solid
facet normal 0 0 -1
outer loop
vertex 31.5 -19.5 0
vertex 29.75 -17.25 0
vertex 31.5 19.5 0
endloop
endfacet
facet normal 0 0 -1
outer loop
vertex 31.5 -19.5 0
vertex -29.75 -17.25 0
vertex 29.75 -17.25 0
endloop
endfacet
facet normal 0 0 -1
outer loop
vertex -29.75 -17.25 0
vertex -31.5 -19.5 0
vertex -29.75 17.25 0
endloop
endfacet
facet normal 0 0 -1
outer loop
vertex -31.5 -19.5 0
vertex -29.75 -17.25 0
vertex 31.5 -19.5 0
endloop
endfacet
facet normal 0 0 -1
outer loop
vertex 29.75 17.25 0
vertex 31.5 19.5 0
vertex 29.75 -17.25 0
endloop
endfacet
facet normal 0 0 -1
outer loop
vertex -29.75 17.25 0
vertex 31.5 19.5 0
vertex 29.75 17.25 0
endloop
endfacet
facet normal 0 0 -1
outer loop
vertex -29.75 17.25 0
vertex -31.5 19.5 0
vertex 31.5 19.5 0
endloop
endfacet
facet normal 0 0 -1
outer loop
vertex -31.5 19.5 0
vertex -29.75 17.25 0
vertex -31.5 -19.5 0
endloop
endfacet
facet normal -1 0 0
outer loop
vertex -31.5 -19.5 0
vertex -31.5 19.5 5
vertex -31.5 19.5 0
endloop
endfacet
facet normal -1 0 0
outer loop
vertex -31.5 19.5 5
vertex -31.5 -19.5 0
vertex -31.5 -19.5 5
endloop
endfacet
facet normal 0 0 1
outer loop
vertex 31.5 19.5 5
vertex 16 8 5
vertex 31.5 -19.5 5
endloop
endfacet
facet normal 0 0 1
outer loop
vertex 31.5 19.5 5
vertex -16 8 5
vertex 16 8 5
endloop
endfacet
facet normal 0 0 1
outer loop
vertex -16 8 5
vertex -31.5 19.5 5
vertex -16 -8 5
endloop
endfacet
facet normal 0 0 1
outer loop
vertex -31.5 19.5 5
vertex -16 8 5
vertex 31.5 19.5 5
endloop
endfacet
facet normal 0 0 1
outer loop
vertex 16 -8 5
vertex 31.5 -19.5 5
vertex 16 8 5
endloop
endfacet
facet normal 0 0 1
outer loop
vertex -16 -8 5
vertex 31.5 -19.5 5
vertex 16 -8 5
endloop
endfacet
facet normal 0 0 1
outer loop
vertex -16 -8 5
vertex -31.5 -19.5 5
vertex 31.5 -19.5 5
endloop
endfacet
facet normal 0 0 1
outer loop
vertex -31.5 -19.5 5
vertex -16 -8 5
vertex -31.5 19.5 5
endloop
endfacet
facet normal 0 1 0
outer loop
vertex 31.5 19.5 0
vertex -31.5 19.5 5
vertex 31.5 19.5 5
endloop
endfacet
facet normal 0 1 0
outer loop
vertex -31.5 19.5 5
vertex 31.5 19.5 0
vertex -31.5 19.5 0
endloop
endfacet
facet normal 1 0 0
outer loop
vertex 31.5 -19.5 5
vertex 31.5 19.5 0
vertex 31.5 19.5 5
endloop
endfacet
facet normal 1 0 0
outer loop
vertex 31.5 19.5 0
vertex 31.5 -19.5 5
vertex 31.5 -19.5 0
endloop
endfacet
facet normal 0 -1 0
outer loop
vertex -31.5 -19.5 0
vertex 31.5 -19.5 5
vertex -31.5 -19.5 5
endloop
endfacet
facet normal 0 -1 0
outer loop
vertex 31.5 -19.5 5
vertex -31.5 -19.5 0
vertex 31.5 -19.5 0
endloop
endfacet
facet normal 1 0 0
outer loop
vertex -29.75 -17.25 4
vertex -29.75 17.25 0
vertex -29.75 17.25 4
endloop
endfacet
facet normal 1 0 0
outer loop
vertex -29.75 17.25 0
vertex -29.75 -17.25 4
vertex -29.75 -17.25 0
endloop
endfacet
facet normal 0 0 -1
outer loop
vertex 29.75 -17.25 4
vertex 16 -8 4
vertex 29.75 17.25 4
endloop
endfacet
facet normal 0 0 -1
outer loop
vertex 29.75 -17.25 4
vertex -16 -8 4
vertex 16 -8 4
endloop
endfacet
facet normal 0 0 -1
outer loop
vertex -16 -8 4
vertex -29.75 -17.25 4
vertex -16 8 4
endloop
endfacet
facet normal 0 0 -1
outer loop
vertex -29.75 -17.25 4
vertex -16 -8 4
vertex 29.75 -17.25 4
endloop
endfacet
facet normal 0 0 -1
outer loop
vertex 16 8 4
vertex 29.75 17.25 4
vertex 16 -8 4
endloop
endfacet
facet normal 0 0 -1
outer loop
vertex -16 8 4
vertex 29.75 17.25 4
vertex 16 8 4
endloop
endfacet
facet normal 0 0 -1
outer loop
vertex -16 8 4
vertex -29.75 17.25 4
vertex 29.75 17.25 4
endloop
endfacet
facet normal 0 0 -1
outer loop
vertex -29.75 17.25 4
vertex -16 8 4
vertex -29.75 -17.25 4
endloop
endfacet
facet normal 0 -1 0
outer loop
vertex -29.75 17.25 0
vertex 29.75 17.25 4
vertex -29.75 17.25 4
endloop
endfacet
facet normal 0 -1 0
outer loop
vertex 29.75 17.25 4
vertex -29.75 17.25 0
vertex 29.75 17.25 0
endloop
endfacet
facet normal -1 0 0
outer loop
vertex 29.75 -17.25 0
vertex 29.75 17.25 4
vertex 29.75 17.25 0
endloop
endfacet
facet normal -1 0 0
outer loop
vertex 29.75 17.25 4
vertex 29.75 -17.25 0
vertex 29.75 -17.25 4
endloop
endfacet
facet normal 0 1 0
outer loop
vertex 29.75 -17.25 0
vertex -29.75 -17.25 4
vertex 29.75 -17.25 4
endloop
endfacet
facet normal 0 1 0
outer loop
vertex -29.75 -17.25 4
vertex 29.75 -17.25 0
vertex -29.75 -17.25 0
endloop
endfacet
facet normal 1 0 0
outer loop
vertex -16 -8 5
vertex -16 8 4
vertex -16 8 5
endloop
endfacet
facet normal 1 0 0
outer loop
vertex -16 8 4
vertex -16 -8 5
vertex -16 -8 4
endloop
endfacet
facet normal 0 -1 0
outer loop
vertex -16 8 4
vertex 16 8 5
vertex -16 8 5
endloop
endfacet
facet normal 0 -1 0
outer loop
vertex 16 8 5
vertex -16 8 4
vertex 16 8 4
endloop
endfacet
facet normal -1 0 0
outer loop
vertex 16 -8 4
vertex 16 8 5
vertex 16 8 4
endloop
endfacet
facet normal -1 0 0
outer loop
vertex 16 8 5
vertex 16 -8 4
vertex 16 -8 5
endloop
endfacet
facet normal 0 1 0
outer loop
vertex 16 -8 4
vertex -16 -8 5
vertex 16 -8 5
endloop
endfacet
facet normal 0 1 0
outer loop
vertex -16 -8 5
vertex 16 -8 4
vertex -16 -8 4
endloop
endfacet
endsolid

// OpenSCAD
difference() {
  linear_extrude(height = 5)
    square([63, 39], center = true);

  translate([0, 0, -1])
    linear_extrude(height = 5)
      square([59.5, 34.5], center = true);


  translate([0, 0, -1])
    linear_extrude(height = 10)
      square([32, 16], center = true);


}
